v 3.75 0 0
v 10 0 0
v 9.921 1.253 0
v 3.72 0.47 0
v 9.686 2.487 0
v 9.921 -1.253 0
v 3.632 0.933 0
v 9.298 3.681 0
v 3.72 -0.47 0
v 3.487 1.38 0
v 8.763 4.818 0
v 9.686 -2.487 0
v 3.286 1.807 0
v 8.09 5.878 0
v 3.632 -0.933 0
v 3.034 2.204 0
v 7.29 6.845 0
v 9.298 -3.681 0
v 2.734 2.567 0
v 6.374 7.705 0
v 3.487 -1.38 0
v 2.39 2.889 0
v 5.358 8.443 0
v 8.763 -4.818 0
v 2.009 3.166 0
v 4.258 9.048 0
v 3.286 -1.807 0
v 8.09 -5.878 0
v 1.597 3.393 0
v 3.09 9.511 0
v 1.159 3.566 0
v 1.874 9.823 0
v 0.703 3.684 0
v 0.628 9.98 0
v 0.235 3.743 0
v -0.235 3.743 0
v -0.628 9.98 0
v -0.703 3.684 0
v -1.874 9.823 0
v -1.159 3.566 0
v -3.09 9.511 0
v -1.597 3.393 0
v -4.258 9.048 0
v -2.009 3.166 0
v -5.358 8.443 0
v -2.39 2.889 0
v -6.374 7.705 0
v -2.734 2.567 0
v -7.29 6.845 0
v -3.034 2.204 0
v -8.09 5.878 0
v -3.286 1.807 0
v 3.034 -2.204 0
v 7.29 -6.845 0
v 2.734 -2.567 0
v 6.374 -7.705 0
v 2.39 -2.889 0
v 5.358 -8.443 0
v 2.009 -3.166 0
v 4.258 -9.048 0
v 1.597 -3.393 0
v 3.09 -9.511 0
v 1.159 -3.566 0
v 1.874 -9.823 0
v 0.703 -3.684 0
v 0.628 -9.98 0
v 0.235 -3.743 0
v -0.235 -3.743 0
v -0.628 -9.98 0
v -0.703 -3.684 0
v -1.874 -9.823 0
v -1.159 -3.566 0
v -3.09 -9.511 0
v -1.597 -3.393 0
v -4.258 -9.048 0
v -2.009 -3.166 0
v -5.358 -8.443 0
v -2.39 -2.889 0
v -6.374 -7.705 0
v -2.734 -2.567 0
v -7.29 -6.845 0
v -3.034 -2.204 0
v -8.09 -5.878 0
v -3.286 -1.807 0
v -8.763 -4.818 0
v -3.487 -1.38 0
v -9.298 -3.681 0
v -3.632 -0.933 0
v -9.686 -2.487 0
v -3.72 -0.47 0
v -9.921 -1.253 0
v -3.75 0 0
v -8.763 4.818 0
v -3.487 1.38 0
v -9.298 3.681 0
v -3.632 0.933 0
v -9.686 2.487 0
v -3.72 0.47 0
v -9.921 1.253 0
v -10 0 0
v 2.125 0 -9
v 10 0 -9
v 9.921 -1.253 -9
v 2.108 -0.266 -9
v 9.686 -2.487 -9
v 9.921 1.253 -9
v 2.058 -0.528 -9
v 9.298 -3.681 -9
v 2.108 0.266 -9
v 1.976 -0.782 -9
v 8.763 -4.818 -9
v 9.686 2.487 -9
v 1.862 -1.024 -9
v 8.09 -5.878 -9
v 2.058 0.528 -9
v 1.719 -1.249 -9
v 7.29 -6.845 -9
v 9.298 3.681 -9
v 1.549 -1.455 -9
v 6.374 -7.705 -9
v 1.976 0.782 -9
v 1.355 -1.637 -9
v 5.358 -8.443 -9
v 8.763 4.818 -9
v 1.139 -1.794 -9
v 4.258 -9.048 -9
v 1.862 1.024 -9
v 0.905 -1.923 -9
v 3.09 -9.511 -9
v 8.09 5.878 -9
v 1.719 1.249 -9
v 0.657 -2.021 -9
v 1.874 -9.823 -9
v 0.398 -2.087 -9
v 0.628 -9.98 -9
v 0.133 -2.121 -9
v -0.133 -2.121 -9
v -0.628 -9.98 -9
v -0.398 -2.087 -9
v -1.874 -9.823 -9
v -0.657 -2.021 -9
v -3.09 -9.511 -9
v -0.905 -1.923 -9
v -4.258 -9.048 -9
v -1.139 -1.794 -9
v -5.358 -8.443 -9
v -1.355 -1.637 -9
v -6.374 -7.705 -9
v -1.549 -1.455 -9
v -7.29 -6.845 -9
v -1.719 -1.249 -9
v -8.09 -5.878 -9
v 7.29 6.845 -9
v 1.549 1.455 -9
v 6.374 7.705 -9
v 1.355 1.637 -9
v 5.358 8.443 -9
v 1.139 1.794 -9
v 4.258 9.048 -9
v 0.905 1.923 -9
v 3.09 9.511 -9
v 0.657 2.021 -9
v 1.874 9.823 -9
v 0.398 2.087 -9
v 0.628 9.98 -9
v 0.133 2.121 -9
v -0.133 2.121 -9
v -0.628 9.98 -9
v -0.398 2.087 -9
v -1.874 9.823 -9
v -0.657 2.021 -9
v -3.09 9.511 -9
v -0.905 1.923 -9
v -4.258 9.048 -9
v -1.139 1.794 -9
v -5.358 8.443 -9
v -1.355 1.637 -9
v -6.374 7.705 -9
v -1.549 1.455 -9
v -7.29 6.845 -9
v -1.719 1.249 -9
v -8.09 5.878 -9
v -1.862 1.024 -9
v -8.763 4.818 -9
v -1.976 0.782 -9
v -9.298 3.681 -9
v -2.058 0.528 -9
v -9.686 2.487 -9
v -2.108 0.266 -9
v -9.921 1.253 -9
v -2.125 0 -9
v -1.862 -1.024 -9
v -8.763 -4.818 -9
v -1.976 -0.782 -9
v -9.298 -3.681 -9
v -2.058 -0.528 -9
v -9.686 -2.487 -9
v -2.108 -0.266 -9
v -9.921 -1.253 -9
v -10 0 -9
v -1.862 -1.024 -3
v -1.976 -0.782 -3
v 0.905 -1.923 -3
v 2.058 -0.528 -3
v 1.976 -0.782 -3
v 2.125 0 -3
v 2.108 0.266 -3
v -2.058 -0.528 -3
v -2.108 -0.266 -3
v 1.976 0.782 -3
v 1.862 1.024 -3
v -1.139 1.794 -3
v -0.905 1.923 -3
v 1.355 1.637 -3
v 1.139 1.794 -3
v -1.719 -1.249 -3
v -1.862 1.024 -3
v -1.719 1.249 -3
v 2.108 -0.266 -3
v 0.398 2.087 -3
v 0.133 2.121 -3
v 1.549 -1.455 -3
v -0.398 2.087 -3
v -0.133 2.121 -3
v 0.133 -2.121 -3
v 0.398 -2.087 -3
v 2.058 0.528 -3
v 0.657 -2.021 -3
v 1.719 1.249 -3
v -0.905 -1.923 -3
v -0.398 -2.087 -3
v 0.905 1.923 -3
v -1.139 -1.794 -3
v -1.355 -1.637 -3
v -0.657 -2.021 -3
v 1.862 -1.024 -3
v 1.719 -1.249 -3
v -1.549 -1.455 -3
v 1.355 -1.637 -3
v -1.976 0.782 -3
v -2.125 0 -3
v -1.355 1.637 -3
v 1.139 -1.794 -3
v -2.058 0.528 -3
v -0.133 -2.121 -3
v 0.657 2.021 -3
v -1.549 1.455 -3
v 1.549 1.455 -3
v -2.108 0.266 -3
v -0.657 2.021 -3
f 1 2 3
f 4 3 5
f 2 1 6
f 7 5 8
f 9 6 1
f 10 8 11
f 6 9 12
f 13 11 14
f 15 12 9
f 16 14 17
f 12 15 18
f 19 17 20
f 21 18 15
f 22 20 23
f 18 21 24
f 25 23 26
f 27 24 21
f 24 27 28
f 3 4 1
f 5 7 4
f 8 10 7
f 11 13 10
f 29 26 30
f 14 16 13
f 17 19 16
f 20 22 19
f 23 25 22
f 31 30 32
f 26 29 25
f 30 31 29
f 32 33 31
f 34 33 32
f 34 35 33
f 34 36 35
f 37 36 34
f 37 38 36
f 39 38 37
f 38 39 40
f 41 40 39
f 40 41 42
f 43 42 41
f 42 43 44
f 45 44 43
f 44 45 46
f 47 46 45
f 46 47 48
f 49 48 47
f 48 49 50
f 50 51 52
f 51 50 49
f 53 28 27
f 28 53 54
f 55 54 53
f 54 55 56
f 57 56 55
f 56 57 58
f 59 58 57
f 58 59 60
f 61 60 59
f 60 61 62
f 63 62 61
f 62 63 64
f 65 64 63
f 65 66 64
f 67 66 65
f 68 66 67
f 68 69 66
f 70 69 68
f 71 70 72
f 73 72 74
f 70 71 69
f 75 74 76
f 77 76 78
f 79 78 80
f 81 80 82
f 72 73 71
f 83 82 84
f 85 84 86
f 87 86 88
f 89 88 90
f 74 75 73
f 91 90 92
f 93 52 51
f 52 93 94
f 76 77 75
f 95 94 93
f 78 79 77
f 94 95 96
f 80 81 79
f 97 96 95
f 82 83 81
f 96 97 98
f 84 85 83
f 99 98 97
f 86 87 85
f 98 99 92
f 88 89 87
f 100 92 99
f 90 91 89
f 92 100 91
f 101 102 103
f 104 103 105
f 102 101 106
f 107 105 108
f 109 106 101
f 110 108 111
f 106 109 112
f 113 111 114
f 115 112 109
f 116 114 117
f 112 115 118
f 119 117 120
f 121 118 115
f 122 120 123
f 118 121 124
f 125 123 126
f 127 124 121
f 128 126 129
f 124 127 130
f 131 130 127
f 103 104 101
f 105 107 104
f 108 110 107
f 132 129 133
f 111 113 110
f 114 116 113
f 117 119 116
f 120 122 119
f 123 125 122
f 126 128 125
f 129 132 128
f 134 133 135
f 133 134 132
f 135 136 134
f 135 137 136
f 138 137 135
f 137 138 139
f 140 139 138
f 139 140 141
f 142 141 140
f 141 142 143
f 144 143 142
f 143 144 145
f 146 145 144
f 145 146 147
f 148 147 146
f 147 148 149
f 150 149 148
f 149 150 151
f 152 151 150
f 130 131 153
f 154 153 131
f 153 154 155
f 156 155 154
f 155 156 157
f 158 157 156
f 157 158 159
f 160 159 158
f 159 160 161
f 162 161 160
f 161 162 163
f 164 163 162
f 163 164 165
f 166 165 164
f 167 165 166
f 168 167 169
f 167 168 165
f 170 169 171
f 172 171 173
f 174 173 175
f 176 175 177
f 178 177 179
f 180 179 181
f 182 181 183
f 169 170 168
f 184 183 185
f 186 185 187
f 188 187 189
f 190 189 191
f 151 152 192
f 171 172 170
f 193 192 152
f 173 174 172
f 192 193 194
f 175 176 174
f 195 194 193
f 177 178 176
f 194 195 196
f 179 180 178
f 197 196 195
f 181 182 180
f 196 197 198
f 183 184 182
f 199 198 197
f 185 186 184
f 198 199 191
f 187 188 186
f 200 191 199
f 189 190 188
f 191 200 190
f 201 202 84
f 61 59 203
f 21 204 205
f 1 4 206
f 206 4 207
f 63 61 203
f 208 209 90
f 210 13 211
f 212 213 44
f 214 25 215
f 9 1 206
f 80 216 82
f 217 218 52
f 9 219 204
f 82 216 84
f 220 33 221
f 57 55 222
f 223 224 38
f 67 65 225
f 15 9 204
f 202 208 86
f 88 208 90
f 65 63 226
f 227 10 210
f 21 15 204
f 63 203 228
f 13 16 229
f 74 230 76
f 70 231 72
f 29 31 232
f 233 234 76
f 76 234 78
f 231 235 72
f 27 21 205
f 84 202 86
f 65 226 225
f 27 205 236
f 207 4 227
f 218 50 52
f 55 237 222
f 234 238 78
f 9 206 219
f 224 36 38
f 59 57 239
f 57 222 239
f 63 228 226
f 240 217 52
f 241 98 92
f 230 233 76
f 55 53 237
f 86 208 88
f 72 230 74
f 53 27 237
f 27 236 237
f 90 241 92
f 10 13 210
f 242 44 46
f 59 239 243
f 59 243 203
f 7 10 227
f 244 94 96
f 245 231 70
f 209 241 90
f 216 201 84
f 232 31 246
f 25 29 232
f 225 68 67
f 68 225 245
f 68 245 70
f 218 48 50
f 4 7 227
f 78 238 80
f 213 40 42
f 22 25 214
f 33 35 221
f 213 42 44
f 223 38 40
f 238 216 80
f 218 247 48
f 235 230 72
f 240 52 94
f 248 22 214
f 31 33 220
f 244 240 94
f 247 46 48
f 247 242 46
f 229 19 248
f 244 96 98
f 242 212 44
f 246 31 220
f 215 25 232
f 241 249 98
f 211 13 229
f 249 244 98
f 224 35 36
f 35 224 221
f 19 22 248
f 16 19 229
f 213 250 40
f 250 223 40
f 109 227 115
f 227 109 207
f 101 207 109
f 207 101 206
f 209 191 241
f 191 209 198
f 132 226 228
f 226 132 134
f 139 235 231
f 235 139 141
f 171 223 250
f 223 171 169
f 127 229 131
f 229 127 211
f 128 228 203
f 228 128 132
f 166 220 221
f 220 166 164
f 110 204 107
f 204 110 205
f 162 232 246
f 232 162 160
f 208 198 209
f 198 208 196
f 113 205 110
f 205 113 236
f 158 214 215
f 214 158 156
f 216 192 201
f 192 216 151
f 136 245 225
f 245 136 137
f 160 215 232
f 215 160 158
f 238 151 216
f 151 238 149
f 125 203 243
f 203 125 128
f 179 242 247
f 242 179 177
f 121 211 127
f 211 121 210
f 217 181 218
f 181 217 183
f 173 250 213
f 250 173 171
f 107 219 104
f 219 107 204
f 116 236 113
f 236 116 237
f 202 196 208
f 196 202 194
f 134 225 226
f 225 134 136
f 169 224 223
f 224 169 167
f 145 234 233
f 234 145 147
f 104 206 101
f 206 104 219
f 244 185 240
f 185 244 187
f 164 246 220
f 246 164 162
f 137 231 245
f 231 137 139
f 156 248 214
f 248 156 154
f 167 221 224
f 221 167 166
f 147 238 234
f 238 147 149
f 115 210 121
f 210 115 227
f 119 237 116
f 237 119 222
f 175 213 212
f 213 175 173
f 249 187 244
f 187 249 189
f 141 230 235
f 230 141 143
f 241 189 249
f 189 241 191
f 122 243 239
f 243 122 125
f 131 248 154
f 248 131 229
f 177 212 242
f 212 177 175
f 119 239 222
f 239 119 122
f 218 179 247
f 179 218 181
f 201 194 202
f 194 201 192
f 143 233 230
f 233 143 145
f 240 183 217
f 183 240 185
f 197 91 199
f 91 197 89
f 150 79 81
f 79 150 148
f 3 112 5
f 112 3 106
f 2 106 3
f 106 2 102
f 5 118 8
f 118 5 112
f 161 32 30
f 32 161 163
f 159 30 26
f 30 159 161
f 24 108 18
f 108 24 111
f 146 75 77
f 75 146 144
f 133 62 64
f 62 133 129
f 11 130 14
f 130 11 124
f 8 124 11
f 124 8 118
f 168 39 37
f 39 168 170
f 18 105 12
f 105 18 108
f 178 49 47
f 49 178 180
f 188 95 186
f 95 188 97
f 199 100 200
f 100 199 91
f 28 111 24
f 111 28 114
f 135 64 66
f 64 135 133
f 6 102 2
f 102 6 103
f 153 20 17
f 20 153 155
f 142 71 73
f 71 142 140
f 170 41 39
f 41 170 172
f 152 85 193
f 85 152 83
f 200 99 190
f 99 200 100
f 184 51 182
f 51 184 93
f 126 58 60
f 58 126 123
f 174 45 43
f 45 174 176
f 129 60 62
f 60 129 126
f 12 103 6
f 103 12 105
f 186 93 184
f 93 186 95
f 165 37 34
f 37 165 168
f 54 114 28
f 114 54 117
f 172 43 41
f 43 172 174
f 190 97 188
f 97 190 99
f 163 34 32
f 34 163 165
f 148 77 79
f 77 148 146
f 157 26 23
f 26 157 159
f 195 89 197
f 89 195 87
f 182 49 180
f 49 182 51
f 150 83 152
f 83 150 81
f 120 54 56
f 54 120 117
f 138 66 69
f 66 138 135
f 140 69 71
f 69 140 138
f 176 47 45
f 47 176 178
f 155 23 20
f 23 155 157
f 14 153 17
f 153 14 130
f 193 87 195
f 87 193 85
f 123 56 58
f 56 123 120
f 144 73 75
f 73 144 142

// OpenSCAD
$fn = 50;


difference() {
	union() {
		translate(v = [0, 0, -9.0000000000]) {
			cylinder(h = 9, r = 10.0000000000);
		}
		cylinder(h = 0, r = 20.0000000000);
	}
	union() {
		translate(v = [0, 0, 0]) {
			rotate(a = [0, 0, 0]) {
				difference() {
					union() {
						#translate(v = [0, 0, -9.0000000000]) {
							cylinder(h = 9, r = 2.0000000000);
						}
						#translate(v = [0, 0, -3]) {
							cylinder(h = 3, r1 = 2.1250000000, r2 = 3.7500000000);
						}
						#translate(v = [0, 0, -9.0000000000]) {
							cylinder(h = 9, r = 2.1250000000);
						}
						#translate(v = [0, 0, -9.0000000000]) {
							cylinder(h = 9, r = 2.0000000000);
						}
					}
					union();
				}
			}
		}
	}
}
